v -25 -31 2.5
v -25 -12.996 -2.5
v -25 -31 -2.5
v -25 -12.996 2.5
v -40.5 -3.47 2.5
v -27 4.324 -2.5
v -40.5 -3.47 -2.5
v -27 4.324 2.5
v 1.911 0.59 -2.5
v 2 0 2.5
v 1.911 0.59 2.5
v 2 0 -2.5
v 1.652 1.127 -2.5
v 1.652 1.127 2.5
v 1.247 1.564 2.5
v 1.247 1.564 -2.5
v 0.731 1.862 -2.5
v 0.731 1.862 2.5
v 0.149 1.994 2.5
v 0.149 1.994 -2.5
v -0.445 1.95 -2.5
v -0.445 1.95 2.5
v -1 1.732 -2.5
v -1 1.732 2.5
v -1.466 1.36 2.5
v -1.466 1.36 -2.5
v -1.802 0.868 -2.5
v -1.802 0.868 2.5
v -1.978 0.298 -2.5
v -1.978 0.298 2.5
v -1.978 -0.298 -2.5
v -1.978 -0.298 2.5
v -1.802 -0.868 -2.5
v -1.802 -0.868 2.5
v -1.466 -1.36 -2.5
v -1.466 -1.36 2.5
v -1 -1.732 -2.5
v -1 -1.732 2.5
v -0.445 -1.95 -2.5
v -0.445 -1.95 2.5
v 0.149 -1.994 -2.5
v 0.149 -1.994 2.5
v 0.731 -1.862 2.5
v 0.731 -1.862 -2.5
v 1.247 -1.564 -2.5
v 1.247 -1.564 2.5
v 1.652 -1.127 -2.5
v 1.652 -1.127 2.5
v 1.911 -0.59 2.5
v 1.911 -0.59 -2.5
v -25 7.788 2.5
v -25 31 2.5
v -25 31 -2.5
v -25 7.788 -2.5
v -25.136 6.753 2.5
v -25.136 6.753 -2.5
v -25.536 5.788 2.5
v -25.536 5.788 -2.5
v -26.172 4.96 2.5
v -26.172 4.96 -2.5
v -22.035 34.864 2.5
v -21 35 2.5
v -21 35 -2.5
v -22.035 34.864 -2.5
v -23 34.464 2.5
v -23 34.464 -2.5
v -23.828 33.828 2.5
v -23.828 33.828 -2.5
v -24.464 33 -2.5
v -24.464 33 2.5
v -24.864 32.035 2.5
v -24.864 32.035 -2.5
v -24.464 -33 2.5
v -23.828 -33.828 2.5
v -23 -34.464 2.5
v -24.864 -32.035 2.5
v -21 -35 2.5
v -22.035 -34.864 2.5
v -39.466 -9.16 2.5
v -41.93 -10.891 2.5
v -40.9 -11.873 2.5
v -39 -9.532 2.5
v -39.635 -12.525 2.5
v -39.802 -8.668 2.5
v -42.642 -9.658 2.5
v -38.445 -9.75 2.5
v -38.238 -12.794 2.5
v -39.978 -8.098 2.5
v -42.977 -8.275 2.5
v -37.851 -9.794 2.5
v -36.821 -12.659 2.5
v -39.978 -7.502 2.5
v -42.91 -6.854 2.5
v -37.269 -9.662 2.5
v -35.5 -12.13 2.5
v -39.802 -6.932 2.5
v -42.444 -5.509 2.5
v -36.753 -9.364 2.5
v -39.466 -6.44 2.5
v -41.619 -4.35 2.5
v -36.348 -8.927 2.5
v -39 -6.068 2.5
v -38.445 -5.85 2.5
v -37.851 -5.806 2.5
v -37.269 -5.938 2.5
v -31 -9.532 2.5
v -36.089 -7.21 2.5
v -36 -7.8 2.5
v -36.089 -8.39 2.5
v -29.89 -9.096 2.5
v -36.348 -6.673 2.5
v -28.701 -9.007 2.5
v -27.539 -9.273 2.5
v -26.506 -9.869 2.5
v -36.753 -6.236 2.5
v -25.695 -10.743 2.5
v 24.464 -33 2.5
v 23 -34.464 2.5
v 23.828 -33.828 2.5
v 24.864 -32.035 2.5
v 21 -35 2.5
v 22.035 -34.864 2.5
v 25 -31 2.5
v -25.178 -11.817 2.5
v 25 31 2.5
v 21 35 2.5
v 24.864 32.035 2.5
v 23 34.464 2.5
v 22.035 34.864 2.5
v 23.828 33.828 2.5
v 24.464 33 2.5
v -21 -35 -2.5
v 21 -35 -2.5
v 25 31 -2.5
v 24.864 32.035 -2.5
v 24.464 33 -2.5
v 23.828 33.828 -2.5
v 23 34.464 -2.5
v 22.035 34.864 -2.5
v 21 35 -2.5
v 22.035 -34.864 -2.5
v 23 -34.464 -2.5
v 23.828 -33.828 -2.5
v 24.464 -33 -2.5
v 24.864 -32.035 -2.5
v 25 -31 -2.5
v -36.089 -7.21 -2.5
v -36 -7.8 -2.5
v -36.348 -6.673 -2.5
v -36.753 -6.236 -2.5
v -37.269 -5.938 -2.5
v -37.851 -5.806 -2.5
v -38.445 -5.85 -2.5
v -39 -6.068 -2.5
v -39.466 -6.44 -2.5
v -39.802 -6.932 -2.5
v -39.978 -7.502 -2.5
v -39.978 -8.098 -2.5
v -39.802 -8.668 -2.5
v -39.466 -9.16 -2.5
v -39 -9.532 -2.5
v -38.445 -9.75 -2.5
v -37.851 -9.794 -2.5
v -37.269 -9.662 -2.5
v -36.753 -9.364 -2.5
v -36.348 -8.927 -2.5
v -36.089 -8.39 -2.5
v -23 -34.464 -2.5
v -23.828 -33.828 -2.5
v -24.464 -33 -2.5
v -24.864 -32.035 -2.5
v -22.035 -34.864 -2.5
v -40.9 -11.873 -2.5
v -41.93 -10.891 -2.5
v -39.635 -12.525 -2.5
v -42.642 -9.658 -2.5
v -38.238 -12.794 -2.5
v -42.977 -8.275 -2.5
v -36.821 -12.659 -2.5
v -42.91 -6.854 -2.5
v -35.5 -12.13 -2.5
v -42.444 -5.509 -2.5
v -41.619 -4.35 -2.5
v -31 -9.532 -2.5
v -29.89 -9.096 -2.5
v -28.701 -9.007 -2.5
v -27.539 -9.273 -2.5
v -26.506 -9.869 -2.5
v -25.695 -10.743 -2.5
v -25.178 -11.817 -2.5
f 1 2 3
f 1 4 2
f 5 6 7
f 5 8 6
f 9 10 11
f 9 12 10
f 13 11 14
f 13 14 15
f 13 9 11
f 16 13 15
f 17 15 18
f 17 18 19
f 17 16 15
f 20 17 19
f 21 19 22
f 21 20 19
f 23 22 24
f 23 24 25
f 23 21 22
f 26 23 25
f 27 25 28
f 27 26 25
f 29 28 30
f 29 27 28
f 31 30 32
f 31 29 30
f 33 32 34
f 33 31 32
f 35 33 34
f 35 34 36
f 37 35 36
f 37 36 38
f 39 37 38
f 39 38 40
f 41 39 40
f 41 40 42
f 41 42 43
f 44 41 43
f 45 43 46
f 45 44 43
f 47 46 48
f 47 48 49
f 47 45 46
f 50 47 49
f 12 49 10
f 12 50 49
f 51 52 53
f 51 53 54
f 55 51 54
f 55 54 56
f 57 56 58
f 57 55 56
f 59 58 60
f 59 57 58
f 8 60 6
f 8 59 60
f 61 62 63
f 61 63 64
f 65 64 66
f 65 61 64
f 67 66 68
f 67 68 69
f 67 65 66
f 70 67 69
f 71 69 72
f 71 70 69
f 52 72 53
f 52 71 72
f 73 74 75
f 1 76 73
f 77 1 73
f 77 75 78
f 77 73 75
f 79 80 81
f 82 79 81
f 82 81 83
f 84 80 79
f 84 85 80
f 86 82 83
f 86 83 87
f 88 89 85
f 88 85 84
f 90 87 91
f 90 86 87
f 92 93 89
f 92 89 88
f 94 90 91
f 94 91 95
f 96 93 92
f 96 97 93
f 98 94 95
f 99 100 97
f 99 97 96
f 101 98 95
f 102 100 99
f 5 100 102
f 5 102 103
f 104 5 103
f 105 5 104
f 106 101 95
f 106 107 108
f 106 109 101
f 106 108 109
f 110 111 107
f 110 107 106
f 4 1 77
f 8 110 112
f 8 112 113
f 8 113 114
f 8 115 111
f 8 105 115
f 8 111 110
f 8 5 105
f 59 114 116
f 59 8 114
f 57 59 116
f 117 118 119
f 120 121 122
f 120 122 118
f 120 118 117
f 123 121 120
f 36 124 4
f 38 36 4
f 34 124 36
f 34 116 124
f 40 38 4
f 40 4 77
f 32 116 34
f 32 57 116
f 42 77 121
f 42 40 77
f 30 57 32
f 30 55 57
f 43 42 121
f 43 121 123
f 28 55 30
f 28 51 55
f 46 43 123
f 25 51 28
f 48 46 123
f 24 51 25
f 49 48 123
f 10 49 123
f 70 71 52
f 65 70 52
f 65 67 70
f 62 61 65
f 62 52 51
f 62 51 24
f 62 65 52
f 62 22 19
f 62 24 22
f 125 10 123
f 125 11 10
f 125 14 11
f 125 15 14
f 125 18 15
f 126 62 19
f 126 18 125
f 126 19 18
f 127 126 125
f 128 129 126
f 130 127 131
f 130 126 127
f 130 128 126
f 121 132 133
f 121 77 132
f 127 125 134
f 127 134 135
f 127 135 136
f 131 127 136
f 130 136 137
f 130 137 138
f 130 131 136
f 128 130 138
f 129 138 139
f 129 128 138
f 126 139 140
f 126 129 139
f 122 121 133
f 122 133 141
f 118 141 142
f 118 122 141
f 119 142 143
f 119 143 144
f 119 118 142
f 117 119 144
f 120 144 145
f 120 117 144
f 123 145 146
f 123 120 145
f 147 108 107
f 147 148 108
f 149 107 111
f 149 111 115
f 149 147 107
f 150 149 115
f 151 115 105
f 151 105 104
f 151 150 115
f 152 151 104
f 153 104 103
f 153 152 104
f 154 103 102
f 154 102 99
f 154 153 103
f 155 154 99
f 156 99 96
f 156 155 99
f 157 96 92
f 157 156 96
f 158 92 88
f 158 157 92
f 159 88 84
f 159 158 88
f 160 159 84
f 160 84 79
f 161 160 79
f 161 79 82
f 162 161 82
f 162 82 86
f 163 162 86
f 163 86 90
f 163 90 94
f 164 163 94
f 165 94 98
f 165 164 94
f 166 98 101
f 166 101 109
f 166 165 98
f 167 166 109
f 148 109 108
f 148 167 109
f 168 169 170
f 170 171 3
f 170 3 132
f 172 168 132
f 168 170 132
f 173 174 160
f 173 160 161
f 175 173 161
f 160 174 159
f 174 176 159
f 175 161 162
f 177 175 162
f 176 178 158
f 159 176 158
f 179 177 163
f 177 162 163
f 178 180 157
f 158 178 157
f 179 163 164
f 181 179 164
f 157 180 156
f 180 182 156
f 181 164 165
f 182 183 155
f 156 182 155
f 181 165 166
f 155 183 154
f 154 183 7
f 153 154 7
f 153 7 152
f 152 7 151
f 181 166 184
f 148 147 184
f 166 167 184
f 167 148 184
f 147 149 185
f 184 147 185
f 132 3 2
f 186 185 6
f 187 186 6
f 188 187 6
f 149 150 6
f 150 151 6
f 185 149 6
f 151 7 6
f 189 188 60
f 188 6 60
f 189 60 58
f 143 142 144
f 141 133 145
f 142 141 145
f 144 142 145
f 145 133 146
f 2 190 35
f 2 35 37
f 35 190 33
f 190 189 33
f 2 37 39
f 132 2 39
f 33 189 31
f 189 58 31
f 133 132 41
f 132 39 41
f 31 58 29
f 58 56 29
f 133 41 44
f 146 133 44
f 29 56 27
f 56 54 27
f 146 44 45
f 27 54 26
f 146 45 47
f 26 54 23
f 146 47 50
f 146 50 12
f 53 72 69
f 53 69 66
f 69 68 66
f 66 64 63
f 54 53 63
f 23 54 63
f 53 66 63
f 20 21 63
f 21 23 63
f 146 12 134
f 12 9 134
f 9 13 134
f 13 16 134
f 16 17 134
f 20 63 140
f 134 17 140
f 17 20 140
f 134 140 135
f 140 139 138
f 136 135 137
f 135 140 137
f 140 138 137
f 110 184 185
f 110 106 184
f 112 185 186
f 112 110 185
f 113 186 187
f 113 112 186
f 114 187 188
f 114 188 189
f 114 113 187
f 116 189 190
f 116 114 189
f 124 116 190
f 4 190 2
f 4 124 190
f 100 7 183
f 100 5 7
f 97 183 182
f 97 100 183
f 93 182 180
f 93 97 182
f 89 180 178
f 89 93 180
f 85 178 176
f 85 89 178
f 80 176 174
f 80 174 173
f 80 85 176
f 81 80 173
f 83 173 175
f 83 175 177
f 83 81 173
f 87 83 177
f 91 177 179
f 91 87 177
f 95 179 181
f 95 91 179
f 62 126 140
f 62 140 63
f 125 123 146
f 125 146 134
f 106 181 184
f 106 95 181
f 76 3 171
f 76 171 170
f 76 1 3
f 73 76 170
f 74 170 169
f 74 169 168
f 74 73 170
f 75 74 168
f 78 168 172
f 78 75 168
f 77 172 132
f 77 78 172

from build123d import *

# Parameters (mm, degrees)
SKETCH_1_R      = 2
EXTRUDE_1_DEPTH = 2.5


with BuildPart() as part:
    # 草圖1 → 填料-伸長1 (new, symmetric)
    with BuildSketch(Plane.XY):
        with BuildLine():
            Line((-21, -35), (21, -35))
            ThreePointArc((21, -35), (23.828427125, -33.828427125), (25, -31))
            Line((25, -31), (25, 31))
            ThreePointArc((25, 31), (23.828427125, 33.828427125), (21, 35))
            Line((21, 35), (-21, 35))
            ThreePointArc((-21, 35), (-23.828427125, 33.828427125), (-25, 31))
            Line((-25, 31), (-25, 7.788457268))
            ThreePointArc((-25, 7.788457268), (-25.535898385, 5.788457268), (-27, 4.324355653))
            Line((-27, 4.324355653), (-40.5, -3.469872981))
            ThreePointArc((-40.5, -3.469872981), (-42.330127019, -10.3), (-35.5, -12.130127019))
            Line((-35.5, -12.130127019), (-31, -9.532050808))
            ThreePointArc((-31, -9.532050808), (-27, -9.532050808), (-25, -12.996152423))
            Line((-25, -12.996152423), (-25, -31))
            ThreePointArc((-25, -31), (-23.828427125, -33.828427125), (-21, -35))
        make_face()
        Circle(SKETCH_1_R, mode=Mode.SUBTRACT)
        with Locations((-38, -7.8)):
            Circle(SKETCH_1_R, mode=Mode.SUBTRACT)
    extrude(amount=EXTRUDE_1_DEPTH, both=True)


solid = part.part
